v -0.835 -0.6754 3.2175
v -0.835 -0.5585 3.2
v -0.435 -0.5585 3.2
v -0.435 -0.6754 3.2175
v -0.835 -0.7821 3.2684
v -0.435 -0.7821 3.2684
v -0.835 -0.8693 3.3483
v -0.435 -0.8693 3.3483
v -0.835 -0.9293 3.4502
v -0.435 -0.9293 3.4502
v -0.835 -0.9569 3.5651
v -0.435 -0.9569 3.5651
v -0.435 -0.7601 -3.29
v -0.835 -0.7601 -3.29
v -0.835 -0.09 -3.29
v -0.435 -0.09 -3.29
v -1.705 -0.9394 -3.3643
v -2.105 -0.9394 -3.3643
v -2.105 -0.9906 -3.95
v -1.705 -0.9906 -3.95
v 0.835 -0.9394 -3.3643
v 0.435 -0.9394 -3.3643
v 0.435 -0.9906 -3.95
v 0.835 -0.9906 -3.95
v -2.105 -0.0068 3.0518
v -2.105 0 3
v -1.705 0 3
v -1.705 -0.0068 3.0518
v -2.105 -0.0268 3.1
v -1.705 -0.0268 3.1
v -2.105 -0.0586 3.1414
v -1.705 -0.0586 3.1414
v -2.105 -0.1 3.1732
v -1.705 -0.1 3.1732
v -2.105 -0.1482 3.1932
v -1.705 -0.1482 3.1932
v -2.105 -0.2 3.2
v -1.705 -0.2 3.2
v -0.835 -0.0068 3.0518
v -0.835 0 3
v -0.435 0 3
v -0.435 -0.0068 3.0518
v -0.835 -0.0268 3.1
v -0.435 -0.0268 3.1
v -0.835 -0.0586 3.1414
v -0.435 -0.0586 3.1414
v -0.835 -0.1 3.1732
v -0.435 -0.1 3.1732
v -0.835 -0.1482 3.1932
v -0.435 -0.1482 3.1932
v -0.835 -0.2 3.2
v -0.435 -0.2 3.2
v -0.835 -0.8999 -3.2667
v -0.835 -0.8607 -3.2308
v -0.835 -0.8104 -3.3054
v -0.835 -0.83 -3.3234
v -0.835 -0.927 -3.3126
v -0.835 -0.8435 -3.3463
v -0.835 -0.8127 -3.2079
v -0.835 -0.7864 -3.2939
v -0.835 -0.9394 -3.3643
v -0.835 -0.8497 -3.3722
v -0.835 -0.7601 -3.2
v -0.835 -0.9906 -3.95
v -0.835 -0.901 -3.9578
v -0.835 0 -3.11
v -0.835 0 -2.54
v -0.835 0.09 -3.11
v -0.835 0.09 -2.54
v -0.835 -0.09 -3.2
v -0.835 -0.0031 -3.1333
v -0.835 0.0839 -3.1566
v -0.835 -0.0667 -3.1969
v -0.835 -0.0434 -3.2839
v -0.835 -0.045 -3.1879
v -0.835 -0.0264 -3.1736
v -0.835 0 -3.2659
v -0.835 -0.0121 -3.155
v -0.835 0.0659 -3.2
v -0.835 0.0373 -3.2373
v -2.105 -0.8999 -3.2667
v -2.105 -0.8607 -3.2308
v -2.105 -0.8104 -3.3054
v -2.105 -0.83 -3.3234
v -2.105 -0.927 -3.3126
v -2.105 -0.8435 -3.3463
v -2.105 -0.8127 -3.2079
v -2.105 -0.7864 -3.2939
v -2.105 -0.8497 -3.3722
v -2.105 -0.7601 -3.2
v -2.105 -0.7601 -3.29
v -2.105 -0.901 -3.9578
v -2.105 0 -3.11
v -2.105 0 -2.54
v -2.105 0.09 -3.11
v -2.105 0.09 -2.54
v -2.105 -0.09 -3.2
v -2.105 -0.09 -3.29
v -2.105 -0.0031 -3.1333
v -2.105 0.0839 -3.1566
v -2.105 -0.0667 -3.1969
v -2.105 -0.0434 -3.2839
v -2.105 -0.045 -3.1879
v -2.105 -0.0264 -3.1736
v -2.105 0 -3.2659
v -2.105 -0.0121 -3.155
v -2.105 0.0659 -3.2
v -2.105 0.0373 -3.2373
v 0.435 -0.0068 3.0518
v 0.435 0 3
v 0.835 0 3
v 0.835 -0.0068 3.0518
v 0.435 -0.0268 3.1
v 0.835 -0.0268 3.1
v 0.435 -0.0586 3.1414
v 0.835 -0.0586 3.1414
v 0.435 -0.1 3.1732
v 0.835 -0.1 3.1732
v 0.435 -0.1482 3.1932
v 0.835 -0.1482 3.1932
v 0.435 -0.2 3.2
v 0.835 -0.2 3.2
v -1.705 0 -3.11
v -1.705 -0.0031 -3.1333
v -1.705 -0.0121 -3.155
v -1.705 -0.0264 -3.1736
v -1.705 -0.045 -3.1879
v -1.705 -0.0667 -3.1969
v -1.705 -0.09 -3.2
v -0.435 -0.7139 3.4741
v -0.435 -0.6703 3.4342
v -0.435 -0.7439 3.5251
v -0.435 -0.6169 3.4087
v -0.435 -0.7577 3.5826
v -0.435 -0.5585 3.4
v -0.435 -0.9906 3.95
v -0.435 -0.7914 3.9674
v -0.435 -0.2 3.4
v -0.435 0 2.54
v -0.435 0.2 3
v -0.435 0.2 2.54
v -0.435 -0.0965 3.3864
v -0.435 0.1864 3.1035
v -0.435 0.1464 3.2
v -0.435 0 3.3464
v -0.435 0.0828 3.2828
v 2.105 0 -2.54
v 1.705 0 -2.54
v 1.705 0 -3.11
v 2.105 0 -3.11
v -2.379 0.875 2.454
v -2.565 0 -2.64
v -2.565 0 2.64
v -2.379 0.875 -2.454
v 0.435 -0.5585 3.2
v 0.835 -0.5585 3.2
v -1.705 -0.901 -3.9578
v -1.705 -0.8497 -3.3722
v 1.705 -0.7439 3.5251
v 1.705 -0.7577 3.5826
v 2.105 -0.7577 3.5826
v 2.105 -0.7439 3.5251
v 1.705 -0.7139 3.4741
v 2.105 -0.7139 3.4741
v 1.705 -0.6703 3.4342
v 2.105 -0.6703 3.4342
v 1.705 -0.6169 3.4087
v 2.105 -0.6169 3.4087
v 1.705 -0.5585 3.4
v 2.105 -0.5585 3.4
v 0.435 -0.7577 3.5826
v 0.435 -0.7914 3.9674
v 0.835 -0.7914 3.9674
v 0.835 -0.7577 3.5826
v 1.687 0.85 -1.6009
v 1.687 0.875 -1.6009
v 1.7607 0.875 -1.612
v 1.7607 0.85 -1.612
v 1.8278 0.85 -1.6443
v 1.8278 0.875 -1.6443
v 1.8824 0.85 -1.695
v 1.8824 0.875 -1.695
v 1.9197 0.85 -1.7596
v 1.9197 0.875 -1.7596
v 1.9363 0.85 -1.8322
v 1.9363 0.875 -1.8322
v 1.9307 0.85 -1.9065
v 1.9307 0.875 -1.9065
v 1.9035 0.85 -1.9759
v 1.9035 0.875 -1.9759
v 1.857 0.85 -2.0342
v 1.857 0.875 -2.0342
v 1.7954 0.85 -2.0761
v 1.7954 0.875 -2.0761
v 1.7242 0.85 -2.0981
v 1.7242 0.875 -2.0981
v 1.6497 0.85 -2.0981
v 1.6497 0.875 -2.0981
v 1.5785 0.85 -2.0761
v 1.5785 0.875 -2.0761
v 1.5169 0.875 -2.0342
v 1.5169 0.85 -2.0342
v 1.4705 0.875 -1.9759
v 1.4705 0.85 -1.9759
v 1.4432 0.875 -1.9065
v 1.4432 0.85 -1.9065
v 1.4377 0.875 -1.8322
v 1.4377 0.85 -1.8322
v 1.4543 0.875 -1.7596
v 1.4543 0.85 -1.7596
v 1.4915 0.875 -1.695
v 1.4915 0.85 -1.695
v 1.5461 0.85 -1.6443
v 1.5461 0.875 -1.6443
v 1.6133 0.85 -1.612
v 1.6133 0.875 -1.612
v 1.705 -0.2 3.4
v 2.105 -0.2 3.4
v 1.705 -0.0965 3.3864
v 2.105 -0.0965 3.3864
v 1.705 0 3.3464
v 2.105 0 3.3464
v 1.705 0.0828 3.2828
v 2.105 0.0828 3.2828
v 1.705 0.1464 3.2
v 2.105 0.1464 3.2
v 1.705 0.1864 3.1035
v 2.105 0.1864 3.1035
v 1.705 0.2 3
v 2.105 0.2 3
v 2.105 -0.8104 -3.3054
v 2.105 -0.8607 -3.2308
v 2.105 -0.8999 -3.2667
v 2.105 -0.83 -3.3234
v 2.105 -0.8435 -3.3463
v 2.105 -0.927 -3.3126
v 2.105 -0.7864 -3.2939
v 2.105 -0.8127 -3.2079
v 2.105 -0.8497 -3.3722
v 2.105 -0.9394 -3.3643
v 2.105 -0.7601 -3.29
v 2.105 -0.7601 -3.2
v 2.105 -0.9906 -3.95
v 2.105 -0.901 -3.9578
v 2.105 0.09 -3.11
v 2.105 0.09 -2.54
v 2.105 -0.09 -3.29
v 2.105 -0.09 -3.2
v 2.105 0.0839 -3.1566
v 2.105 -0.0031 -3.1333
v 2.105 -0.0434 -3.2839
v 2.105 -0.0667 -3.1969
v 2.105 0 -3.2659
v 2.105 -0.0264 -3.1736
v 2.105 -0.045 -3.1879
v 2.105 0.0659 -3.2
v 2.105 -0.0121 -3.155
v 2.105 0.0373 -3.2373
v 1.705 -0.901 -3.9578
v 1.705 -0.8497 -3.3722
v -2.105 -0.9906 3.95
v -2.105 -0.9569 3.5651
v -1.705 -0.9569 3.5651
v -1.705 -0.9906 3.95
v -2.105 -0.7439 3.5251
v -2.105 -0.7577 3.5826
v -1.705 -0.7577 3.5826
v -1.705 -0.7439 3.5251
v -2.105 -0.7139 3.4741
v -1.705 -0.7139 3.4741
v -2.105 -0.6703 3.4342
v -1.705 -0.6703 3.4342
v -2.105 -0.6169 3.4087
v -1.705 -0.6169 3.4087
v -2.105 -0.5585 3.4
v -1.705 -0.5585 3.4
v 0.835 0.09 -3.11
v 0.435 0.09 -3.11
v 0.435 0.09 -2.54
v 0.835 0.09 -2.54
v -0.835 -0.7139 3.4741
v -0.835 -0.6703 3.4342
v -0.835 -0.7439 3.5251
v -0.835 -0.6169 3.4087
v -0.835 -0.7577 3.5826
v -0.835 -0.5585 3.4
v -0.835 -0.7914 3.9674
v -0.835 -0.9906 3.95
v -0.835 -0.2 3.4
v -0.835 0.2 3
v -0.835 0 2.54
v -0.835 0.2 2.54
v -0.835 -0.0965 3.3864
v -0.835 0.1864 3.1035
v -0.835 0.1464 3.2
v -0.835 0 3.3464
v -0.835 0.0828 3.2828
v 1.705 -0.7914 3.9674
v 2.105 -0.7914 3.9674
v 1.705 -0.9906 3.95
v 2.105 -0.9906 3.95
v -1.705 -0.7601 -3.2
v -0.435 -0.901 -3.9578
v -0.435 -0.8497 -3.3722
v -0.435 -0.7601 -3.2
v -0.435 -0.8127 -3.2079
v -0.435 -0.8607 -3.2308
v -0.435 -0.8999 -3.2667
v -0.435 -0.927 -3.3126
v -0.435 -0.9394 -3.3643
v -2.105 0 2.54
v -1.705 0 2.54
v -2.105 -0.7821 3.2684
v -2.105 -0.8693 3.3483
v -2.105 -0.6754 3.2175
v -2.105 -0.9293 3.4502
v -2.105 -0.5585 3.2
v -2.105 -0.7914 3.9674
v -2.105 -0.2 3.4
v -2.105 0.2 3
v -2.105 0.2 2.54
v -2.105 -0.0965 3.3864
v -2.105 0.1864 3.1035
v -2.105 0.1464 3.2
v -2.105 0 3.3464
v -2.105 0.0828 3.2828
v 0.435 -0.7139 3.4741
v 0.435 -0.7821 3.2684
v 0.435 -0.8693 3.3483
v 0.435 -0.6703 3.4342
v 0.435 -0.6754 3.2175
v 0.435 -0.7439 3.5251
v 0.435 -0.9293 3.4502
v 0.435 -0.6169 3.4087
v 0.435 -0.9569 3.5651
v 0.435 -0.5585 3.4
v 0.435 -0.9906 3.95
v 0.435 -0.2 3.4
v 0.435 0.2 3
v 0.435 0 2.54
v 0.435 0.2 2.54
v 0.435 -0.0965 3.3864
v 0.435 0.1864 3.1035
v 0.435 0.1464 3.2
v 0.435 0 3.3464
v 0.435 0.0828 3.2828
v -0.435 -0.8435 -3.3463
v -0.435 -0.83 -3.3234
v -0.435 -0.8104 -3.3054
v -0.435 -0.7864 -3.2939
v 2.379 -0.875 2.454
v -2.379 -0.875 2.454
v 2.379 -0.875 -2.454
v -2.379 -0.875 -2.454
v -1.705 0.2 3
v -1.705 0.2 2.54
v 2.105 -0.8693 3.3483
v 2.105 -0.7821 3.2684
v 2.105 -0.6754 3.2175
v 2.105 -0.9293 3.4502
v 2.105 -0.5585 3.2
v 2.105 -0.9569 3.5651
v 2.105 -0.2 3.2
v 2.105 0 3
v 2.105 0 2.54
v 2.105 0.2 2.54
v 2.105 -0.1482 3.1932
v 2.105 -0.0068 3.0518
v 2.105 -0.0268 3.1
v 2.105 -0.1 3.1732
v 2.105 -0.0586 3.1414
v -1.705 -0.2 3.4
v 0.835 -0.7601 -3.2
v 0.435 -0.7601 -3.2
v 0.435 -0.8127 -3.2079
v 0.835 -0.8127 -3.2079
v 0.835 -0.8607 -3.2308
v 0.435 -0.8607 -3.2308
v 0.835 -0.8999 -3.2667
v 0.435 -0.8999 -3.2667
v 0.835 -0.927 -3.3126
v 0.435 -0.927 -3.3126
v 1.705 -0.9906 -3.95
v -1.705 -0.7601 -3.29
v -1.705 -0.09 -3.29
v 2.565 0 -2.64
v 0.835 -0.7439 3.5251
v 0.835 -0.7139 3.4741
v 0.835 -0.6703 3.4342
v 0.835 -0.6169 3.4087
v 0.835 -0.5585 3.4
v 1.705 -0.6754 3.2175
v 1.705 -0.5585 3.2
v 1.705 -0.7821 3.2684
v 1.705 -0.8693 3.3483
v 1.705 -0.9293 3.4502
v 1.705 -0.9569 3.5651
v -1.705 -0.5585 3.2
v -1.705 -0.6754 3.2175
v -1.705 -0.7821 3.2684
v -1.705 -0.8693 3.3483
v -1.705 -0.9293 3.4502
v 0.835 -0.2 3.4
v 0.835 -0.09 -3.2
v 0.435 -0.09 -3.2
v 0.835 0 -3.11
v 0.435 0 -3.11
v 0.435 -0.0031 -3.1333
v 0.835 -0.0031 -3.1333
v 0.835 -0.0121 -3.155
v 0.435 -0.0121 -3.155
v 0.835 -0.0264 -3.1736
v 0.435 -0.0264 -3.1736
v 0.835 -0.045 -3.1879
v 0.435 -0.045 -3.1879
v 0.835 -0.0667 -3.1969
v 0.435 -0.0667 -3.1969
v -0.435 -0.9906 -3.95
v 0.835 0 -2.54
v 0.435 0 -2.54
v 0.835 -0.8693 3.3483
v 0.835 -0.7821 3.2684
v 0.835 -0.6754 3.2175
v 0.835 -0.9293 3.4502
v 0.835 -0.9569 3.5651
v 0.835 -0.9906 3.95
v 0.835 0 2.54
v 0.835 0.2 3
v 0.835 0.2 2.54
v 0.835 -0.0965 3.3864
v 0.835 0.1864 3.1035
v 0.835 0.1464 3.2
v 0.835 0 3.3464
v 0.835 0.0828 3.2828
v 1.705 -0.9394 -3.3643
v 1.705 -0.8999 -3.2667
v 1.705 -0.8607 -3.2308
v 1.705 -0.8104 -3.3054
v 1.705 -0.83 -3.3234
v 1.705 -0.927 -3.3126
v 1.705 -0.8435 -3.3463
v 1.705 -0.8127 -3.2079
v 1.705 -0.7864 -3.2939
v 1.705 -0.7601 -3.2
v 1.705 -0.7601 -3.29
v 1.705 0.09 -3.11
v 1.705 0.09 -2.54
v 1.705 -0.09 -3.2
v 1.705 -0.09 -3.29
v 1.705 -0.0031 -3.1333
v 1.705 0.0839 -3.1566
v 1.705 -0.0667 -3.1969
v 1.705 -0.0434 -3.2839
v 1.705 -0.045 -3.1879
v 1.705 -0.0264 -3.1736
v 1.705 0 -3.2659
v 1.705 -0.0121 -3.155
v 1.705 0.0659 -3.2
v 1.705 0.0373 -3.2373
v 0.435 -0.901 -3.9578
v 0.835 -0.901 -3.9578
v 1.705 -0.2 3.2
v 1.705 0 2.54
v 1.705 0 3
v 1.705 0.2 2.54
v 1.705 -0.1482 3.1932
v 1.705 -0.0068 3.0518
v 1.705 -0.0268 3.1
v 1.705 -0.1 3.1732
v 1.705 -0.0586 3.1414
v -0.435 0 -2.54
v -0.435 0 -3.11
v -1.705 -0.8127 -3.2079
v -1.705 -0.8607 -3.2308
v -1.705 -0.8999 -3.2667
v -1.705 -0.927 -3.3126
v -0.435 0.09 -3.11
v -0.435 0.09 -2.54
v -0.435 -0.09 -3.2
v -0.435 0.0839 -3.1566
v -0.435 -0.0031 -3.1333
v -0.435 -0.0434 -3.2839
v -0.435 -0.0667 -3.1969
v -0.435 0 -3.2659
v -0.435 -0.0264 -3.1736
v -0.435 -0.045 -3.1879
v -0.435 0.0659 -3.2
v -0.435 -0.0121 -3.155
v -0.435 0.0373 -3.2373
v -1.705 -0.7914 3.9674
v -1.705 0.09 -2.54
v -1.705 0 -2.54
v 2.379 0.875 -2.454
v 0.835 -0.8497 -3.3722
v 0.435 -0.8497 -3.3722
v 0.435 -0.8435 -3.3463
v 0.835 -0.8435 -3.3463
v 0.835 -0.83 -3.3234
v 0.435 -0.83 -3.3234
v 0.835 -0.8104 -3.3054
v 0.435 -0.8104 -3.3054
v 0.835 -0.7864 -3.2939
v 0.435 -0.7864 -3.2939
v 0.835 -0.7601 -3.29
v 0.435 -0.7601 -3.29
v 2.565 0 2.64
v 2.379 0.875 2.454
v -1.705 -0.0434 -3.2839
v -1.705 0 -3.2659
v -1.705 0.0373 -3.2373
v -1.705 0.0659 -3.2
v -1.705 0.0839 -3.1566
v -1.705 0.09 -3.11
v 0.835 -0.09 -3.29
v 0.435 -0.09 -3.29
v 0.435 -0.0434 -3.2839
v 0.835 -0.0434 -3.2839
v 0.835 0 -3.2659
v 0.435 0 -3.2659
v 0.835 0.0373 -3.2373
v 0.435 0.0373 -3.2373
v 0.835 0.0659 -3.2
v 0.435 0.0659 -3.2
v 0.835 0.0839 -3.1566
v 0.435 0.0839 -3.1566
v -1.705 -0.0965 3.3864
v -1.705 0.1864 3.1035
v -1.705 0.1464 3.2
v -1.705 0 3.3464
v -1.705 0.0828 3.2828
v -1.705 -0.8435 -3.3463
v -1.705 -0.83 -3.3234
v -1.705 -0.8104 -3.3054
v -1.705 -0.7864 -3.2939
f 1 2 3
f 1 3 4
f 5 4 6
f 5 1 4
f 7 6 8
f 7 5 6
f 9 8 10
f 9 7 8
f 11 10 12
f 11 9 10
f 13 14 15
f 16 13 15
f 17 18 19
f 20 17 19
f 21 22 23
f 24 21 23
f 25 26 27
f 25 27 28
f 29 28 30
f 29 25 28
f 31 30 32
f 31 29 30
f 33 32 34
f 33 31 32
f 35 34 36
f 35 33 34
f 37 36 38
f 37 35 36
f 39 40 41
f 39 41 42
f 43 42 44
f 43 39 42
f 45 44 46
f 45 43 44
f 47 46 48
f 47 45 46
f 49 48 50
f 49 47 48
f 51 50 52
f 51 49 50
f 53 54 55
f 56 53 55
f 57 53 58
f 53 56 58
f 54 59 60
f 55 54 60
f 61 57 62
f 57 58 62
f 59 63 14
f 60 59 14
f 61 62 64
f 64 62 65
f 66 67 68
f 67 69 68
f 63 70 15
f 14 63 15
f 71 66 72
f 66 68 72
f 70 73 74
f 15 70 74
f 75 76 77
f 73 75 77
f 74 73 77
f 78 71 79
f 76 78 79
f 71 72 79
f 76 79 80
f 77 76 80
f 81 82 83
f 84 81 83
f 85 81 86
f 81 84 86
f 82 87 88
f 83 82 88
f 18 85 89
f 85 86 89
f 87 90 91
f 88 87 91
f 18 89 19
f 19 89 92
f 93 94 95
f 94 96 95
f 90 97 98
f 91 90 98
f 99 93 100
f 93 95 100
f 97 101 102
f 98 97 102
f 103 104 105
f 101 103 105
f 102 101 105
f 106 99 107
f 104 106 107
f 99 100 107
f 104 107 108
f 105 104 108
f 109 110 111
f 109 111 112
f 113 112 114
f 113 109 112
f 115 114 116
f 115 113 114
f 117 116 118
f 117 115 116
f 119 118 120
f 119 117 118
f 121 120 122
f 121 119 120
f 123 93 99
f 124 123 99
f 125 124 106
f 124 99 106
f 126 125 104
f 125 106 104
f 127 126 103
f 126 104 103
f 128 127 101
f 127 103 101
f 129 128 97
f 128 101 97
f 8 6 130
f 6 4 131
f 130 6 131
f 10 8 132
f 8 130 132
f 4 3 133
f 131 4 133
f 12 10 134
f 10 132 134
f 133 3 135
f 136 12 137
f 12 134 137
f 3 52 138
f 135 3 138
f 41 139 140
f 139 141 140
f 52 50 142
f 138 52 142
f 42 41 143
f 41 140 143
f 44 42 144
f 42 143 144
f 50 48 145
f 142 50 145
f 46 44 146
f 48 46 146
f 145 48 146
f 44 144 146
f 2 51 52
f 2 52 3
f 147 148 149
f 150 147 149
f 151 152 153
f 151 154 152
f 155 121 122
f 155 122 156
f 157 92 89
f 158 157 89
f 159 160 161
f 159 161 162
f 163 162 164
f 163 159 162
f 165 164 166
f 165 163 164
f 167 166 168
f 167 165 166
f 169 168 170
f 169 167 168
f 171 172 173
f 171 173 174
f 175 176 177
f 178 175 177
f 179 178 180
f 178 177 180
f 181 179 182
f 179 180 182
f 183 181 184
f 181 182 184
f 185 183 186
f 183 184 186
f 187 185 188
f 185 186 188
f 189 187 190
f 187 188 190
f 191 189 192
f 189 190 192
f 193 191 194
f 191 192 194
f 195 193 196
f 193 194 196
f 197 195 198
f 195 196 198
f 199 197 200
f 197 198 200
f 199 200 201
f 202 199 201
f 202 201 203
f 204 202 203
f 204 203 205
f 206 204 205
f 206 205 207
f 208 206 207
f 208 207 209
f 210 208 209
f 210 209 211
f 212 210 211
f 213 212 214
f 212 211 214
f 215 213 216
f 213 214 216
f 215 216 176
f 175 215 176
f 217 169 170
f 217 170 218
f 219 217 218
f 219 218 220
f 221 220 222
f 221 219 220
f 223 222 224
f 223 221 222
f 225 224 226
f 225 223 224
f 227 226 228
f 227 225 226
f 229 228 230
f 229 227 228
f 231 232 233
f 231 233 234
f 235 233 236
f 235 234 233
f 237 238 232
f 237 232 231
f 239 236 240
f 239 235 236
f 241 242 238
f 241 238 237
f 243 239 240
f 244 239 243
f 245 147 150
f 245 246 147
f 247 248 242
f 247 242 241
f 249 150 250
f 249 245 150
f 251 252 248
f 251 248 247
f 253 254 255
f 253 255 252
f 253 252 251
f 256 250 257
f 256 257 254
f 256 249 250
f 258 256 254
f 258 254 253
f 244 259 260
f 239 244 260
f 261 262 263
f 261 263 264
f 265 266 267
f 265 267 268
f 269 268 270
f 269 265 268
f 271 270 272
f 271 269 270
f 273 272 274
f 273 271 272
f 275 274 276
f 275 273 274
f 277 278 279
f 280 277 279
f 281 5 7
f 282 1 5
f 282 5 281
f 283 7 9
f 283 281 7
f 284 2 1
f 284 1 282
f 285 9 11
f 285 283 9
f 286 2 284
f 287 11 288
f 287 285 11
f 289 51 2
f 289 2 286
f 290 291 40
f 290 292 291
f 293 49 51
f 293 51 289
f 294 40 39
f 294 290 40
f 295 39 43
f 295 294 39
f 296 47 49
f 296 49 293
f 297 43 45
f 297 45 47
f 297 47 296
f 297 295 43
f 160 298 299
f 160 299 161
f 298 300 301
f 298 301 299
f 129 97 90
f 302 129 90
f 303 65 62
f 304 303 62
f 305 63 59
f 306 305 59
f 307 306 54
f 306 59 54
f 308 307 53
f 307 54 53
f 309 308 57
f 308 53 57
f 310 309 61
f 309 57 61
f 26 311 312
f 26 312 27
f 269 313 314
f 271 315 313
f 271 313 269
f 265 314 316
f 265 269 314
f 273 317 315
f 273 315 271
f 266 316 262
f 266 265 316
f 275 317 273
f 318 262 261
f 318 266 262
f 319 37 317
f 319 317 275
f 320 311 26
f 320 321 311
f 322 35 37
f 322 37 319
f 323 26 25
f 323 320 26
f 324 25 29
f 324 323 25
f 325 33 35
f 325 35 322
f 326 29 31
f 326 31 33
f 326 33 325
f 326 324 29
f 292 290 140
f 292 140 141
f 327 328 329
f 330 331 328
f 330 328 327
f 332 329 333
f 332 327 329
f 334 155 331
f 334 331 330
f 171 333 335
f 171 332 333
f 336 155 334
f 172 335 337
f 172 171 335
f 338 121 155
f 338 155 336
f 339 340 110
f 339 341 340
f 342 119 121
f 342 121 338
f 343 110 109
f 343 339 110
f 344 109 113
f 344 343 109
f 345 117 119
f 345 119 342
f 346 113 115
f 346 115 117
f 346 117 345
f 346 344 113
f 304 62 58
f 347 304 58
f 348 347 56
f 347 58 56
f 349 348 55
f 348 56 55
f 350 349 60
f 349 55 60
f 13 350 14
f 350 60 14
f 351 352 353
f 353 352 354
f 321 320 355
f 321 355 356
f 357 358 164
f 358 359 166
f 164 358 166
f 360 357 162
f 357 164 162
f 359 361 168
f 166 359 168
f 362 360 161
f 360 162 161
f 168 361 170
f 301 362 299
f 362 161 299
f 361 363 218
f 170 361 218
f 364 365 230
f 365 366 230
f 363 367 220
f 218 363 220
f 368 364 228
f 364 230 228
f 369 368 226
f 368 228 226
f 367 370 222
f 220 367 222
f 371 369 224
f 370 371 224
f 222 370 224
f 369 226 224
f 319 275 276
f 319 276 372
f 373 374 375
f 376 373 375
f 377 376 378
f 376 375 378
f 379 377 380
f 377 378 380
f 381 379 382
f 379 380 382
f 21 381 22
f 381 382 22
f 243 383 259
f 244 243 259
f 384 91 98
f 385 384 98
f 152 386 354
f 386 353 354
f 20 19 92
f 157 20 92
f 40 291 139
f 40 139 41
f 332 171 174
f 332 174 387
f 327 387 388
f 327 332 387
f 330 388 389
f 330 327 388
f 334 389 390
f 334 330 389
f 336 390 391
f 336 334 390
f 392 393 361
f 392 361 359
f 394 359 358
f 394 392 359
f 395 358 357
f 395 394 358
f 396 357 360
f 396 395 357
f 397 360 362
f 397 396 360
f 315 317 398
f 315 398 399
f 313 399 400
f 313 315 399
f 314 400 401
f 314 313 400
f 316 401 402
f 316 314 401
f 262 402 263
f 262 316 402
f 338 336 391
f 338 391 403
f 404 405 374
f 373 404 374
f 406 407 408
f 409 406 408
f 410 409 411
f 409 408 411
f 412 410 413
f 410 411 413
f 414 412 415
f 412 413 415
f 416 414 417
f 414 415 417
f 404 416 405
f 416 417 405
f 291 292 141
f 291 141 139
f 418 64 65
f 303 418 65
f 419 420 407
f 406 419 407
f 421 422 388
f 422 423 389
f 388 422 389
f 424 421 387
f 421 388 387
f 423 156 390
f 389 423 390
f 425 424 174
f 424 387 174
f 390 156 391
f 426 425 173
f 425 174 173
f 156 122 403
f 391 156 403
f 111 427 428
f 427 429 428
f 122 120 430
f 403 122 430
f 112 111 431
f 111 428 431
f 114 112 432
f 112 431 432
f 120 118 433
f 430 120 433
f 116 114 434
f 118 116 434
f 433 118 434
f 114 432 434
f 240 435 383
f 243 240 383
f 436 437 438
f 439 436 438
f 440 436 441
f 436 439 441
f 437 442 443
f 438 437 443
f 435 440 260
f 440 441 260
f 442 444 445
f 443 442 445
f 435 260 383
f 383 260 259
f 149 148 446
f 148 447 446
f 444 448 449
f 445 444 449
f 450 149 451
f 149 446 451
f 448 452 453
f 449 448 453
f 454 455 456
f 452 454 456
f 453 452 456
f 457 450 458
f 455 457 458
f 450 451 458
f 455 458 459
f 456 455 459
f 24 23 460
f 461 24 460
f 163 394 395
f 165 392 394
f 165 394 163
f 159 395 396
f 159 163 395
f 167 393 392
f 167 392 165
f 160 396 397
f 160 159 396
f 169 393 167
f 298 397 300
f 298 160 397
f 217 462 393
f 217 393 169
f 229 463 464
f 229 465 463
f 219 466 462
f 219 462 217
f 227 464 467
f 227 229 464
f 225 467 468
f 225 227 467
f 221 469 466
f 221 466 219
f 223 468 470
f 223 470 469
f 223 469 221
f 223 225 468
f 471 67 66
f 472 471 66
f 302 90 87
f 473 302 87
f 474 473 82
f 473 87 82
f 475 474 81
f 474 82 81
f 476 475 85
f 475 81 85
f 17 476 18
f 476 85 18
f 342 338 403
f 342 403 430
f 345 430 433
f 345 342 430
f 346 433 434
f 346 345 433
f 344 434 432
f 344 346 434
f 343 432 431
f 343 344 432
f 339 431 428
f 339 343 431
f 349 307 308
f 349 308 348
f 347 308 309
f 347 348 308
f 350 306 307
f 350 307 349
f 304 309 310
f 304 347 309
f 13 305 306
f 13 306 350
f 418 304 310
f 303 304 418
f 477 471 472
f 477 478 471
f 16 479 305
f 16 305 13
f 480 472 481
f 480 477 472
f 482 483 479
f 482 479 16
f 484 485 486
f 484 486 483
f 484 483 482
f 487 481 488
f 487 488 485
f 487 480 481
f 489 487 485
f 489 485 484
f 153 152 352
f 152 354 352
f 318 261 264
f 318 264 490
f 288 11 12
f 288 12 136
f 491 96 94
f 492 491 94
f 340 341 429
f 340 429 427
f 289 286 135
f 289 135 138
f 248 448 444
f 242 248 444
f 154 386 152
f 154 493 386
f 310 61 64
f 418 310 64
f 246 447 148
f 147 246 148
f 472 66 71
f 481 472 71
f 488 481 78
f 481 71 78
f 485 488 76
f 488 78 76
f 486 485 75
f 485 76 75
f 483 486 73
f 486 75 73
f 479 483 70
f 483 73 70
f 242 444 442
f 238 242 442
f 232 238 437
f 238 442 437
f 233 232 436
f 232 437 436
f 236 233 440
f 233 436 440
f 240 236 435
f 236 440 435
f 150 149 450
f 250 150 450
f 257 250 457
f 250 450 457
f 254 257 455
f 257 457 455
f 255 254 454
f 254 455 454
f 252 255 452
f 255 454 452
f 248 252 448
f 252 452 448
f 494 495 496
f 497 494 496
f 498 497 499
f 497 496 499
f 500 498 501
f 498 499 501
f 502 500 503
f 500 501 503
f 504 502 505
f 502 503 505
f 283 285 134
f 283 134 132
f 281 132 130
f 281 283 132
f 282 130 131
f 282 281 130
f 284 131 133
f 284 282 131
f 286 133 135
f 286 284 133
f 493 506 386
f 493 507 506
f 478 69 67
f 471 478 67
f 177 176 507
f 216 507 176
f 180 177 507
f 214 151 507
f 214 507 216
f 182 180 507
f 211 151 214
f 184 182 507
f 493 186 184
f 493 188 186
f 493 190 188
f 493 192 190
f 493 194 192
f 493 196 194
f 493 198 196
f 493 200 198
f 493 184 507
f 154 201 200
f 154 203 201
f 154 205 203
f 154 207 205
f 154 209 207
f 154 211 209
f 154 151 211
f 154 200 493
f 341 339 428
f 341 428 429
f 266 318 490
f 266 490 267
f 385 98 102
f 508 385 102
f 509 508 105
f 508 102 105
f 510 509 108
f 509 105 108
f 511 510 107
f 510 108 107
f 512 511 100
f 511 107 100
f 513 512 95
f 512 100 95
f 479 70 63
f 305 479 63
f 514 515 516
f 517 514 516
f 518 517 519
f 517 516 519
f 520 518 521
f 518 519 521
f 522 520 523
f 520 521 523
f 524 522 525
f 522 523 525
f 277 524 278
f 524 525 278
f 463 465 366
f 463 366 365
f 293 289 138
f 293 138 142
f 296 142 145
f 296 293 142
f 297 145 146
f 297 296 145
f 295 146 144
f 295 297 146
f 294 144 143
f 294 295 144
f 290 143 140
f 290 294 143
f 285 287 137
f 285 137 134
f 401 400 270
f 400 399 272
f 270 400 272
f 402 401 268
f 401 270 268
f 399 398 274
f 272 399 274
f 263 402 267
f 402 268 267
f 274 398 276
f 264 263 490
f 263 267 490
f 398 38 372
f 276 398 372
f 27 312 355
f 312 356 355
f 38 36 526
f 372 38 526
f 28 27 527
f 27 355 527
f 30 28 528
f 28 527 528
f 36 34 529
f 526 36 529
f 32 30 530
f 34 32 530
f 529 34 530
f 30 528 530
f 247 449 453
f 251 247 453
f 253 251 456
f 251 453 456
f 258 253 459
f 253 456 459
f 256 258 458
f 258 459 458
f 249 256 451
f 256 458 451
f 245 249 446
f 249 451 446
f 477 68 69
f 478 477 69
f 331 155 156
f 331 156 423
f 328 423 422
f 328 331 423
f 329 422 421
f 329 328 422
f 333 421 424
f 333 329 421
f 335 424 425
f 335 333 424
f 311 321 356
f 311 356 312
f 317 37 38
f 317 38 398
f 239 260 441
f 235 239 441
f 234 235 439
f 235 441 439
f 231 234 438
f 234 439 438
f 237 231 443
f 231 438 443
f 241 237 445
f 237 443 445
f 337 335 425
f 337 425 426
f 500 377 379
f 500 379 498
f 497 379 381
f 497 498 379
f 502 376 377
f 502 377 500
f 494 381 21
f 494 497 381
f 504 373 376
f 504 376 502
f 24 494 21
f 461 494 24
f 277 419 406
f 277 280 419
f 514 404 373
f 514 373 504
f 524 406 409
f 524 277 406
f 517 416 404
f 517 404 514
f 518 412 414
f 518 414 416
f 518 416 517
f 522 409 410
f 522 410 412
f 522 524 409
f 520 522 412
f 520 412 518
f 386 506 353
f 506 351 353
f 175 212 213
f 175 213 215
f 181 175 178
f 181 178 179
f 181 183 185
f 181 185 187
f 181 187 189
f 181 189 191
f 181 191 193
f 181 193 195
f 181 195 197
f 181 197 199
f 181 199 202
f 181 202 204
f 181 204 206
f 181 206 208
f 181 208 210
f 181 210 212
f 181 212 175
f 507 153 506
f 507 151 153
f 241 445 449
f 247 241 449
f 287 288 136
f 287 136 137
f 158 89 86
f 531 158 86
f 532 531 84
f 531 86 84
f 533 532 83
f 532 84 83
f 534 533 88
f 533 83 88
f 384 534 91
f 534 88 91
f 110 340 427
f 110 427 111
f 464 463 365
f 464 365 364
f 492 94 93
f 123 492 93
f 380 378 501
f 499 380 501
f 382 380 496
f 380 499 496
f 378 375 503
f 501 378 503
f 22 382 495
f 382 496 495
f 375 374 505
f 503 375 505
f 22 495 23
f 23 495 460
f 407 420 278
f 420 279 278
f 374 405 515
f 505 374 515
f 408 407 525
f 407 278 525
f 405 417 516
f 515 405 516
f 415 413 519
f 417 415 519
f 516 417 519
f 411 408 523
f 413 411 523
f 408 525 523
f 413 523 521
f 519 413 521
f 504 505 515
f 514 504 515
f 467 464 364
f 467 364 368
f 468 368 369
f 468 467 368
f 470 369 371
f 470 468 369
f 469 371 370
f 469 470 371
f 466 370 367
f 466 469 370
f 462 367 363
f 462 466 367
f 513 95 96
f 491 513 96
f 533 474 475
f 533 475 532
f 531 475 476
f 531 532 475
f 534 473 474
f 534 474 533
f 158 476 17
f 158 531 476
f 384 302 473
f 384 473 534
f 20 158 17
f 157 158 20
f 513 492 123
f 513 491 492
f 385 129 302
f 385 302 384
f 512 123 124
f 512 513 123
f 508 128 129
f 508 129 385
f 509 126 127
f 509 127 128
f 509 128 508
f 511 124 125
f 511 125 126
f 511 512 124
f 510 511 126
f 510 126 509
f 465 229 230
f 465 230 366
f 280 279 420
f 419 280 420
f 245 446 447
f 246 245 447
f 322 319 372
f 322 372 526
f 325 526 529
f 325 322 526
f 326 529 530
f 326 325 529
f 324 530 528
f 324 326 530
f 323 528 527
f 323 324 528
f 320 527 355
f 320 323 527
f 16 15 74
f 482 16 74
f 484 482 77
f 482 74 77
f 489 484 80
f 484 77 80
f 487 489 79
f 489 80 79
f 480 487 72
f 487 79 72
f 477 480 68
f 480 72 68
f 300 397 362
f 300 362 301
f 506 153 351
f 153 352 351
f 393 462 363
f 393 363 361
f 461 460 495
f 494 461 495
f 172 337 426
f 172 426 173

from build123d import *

# Parameters (mm, degrees)
SKETCH1_W                     = 5.13
SKETCH1_H                     = 5.28
BOSS_EXTRUDE1_DEPTH           = 0.875
BOSS_EXTRUDE1_TAPER           = 12
BOSS_EXTRUDE1_OTHER_WAY_DEPTH = 0.875
BOSS_EXTRUDE1_OTHER_WAY_TAPER = 12
BASE_FLANGE1_DEPTH            = 0.2
BASE_FLANGE1_DEPTH_BACK       = 0.2
LPATTERN1_COUNT               = 3
LPATTERN1_PITCH               = 1.27
LPATTERN1_2_COUNT             = 2
LPATTERN1_2_PITCH             = 1.27
BASE_FLANGE2_DEPTH            = 0.2
BASE_FLANGE2_DEPTH_BACK       = 0.2
LPATTERN2_COUNT               = 2
LPATTERN2_PITCH               = 1.27
LPATTERN2_2_COUNT             = 3
LPATTERN2_2_PITCH             = 1.27
SKETCH87_R                    = 0.25
CUT_EXTRUDE1_DEPTH            = 0.025


# Sheet-metal steps are written as plain solids
with BuildPart() as part:
    # Sketch1 → Boss-Extrude1 (new body)
    with BuildSketch(Plane(origin=(0, 0, 0), x_dir=(1, 0, 0), z_dir=(0, 1, 0))):
        Rectangle(SKETCH1_W, SKETCH1_H)
    extrude(amount=BOSS_EXTRUDE1_DEPTH, taper=BOSS_EXTRUDE1_TAPER)

    # Sketch1 → Boss-Extrude1 other way (add)
    with BuildSketch(Plane(origin=(0, 0, 0), x_dir=(1, 0, 0), z_dir=(0, 1, 0))):
        Rectangle(SKETCH1_W, SKETCH1_H)
    extrude(amount=-BOSS_EXTRUDE1_OTHER_WAY_DEPTH, taper=BOSS_EXTRUDE1_OTHER_WAY_TAPER)

    # Sketch87 → Cut-Extrude1 (cut)
    with BuildSketch(Plane(origin=(0, 0.875, 0), x_dir=(1, 0, 0), z_dir=(0, 1, 0))):
        with Locations(Location((1.686972144, 1.850895493, 0), (0, 0, 270))):
            Circle(SKETCH87_R)
    extrude(amount=-CUT_EXTRUDE1_DEPTH, mode=Mode.SUBTRACT)


with BuildPart() as body_2:
    # Sketch2 → Base-Flange1 (new, two sides: drawn at the far end of the back side and taken through both)
    with BuildSketch(Plane(origin=(-0.635, 0, 0), x_dir=(0, 0, -1), z_dir=(1, 0, 0)).offset(-BASE_FLANGE1_DEPTH_BACK)):
        with BuildLine():
            Line((-2.54, 0), (-2.64, 0))
            Line((-2.64, 0), (-3, 0))
            ThreePointArc((-3, 0), (-3.141421356, -0.058578644), (-3.2, -0.2))
            Line((-3.2, -0.2), (-3.2, -0.55846753))
            ThreePointArc((-3.2, -0.55846753), (-3.305089065, -0.828703613), (-3.565137703, -0.95694541))
            Line((-3.565137703, -0.95694541), (-3.95, -0.990616498))
            Line((-3.95, -0.990616498), (-3.967431149, -0.791377558))
            Line((-3.967431149, -0.791377558), (-3.582568851, -0.75770647))
            ThreePointArc((-3.582568851, -0.75770647), (-3.452544533, -0.693585572), (-3.4, -0.55846753))
            Line((-3.4, -0.55846753), (-3.4, -0.2))
            ThreePointArc((-3.4, -0.2), (-3.282842712, 0.082842712), (-3, 0.2))
            Line((-3, 0.2), (-2.64, 0.2))
            Line((-2.64, 0.2), (-2.54, 0.2))
            Line((-2.54, 0.2), (-2.54, 0))
        make_face()
    extrude(amount=BASE_FLANGE1_DEPTH + BASE_FLANGE1_DEPTH_BACK)


with BuildPart() as lpattern1_1:
    # LPattern1: pattern copy
    add(body_2.part.moved(Location(Vector(1, 0, 0) * (1 * LPATTERN1_PITCH))))


with BuildPart() as lpattern1_2:
    # LPattern1: pattern copy
    add(body_2.part.moved(Location(Vector(1, 0, 0) * (2 * LPATTERN1_PITCH))))


with BuildPart() as lpattern1_2_1:
    # LPattern1 2: pattern copy
    add(body_2.part.moved(Location(Vector(-1, 0, 0) * (1 * LPATTERN1_2_PITCH))))


with BuildPart() as body_6:
    # Sketch58 → Base-Flange2 (new, two sides: drawn at the far end of the back side and taken through both)
    with BuildSketch(Plane(origin=(-0.635, 0, 0), x_dir=(0, 0, -1), z_dir=(1, 0, 0)).offset(-BASE_FLANGE2_DEPTH_BACK)):
        with BuildLine():
            Line((2.54, 0), (2.64, 0))
            Line((2.64, 0), (3.11, 0))
            ThreePointArc((3.11, 0), (3.17363961, -0.02636039), (3.2, -0.09))
            Line((3.2, -0.09), (3.2, -0.760060389))
            ThreePointArc((3.2, -0.760060389), (3.247290079, -0.881666626), (3.364311966, -0.939375434))
            Line((3.364311966, -0.939375434), (3.95, -0.990616498))
            Line((3.95, -0.990616498), (3.957844017, -0.900958975))
            Line((3.957844017, -0.900958975), (3.372155983, -0.849717912))
            ThreePointArc((3.372155983, -0.849717912), (3.31364504, -0.820863507), (3.29, -0.760060389))
            Line((3.29, -0.760060389), (3.29, -0.09))
            ThreePointArc((3.29, -0.09), (3.237279221, 0.037279221), (3.11, 0.09))
            Line((3.11, 0.09), (2.64, 0.09))
            Line((2.64, 0.09), (2.54, 0.09))
            Line((2.54, 0.09), (2.54, 0))
        make_face()
    extrude(amount=BASE_FLANGE2_DEPTH + BASE_FLANGE2_DEPTH_BACK)


with BuildPart() as lpattern2_1:
    # LPattern2: pattern copy
    add(body_6.part.moved(Location(Vector(-1, 0, 0) * (1 * LPATTERN2_PITCH))))


with BuildPart() as lpattern2_2_1:
    # LPattern2 2: pattern copy
    add(body_6.part.moved(Location(Vector(1, 0, 0) * (1 * LPATTERN2_2_PITCH))))


with BuildPart() as lpattern2_2_2:
    # LPattern2 2: pattern copy
    add(body_6.part.moved(Location(Vector(1, 0, 0) * (2 * LPATTERN2_2_PITCH))))


solid = Compound([part.part, body_2.part, lpattern1_1.part, lpattern1_2.part, lpattern1_2_1.part, body_6.part, lpattern2_1.part, lpattern2_2_1.part, lpattern2_2_2.part])
